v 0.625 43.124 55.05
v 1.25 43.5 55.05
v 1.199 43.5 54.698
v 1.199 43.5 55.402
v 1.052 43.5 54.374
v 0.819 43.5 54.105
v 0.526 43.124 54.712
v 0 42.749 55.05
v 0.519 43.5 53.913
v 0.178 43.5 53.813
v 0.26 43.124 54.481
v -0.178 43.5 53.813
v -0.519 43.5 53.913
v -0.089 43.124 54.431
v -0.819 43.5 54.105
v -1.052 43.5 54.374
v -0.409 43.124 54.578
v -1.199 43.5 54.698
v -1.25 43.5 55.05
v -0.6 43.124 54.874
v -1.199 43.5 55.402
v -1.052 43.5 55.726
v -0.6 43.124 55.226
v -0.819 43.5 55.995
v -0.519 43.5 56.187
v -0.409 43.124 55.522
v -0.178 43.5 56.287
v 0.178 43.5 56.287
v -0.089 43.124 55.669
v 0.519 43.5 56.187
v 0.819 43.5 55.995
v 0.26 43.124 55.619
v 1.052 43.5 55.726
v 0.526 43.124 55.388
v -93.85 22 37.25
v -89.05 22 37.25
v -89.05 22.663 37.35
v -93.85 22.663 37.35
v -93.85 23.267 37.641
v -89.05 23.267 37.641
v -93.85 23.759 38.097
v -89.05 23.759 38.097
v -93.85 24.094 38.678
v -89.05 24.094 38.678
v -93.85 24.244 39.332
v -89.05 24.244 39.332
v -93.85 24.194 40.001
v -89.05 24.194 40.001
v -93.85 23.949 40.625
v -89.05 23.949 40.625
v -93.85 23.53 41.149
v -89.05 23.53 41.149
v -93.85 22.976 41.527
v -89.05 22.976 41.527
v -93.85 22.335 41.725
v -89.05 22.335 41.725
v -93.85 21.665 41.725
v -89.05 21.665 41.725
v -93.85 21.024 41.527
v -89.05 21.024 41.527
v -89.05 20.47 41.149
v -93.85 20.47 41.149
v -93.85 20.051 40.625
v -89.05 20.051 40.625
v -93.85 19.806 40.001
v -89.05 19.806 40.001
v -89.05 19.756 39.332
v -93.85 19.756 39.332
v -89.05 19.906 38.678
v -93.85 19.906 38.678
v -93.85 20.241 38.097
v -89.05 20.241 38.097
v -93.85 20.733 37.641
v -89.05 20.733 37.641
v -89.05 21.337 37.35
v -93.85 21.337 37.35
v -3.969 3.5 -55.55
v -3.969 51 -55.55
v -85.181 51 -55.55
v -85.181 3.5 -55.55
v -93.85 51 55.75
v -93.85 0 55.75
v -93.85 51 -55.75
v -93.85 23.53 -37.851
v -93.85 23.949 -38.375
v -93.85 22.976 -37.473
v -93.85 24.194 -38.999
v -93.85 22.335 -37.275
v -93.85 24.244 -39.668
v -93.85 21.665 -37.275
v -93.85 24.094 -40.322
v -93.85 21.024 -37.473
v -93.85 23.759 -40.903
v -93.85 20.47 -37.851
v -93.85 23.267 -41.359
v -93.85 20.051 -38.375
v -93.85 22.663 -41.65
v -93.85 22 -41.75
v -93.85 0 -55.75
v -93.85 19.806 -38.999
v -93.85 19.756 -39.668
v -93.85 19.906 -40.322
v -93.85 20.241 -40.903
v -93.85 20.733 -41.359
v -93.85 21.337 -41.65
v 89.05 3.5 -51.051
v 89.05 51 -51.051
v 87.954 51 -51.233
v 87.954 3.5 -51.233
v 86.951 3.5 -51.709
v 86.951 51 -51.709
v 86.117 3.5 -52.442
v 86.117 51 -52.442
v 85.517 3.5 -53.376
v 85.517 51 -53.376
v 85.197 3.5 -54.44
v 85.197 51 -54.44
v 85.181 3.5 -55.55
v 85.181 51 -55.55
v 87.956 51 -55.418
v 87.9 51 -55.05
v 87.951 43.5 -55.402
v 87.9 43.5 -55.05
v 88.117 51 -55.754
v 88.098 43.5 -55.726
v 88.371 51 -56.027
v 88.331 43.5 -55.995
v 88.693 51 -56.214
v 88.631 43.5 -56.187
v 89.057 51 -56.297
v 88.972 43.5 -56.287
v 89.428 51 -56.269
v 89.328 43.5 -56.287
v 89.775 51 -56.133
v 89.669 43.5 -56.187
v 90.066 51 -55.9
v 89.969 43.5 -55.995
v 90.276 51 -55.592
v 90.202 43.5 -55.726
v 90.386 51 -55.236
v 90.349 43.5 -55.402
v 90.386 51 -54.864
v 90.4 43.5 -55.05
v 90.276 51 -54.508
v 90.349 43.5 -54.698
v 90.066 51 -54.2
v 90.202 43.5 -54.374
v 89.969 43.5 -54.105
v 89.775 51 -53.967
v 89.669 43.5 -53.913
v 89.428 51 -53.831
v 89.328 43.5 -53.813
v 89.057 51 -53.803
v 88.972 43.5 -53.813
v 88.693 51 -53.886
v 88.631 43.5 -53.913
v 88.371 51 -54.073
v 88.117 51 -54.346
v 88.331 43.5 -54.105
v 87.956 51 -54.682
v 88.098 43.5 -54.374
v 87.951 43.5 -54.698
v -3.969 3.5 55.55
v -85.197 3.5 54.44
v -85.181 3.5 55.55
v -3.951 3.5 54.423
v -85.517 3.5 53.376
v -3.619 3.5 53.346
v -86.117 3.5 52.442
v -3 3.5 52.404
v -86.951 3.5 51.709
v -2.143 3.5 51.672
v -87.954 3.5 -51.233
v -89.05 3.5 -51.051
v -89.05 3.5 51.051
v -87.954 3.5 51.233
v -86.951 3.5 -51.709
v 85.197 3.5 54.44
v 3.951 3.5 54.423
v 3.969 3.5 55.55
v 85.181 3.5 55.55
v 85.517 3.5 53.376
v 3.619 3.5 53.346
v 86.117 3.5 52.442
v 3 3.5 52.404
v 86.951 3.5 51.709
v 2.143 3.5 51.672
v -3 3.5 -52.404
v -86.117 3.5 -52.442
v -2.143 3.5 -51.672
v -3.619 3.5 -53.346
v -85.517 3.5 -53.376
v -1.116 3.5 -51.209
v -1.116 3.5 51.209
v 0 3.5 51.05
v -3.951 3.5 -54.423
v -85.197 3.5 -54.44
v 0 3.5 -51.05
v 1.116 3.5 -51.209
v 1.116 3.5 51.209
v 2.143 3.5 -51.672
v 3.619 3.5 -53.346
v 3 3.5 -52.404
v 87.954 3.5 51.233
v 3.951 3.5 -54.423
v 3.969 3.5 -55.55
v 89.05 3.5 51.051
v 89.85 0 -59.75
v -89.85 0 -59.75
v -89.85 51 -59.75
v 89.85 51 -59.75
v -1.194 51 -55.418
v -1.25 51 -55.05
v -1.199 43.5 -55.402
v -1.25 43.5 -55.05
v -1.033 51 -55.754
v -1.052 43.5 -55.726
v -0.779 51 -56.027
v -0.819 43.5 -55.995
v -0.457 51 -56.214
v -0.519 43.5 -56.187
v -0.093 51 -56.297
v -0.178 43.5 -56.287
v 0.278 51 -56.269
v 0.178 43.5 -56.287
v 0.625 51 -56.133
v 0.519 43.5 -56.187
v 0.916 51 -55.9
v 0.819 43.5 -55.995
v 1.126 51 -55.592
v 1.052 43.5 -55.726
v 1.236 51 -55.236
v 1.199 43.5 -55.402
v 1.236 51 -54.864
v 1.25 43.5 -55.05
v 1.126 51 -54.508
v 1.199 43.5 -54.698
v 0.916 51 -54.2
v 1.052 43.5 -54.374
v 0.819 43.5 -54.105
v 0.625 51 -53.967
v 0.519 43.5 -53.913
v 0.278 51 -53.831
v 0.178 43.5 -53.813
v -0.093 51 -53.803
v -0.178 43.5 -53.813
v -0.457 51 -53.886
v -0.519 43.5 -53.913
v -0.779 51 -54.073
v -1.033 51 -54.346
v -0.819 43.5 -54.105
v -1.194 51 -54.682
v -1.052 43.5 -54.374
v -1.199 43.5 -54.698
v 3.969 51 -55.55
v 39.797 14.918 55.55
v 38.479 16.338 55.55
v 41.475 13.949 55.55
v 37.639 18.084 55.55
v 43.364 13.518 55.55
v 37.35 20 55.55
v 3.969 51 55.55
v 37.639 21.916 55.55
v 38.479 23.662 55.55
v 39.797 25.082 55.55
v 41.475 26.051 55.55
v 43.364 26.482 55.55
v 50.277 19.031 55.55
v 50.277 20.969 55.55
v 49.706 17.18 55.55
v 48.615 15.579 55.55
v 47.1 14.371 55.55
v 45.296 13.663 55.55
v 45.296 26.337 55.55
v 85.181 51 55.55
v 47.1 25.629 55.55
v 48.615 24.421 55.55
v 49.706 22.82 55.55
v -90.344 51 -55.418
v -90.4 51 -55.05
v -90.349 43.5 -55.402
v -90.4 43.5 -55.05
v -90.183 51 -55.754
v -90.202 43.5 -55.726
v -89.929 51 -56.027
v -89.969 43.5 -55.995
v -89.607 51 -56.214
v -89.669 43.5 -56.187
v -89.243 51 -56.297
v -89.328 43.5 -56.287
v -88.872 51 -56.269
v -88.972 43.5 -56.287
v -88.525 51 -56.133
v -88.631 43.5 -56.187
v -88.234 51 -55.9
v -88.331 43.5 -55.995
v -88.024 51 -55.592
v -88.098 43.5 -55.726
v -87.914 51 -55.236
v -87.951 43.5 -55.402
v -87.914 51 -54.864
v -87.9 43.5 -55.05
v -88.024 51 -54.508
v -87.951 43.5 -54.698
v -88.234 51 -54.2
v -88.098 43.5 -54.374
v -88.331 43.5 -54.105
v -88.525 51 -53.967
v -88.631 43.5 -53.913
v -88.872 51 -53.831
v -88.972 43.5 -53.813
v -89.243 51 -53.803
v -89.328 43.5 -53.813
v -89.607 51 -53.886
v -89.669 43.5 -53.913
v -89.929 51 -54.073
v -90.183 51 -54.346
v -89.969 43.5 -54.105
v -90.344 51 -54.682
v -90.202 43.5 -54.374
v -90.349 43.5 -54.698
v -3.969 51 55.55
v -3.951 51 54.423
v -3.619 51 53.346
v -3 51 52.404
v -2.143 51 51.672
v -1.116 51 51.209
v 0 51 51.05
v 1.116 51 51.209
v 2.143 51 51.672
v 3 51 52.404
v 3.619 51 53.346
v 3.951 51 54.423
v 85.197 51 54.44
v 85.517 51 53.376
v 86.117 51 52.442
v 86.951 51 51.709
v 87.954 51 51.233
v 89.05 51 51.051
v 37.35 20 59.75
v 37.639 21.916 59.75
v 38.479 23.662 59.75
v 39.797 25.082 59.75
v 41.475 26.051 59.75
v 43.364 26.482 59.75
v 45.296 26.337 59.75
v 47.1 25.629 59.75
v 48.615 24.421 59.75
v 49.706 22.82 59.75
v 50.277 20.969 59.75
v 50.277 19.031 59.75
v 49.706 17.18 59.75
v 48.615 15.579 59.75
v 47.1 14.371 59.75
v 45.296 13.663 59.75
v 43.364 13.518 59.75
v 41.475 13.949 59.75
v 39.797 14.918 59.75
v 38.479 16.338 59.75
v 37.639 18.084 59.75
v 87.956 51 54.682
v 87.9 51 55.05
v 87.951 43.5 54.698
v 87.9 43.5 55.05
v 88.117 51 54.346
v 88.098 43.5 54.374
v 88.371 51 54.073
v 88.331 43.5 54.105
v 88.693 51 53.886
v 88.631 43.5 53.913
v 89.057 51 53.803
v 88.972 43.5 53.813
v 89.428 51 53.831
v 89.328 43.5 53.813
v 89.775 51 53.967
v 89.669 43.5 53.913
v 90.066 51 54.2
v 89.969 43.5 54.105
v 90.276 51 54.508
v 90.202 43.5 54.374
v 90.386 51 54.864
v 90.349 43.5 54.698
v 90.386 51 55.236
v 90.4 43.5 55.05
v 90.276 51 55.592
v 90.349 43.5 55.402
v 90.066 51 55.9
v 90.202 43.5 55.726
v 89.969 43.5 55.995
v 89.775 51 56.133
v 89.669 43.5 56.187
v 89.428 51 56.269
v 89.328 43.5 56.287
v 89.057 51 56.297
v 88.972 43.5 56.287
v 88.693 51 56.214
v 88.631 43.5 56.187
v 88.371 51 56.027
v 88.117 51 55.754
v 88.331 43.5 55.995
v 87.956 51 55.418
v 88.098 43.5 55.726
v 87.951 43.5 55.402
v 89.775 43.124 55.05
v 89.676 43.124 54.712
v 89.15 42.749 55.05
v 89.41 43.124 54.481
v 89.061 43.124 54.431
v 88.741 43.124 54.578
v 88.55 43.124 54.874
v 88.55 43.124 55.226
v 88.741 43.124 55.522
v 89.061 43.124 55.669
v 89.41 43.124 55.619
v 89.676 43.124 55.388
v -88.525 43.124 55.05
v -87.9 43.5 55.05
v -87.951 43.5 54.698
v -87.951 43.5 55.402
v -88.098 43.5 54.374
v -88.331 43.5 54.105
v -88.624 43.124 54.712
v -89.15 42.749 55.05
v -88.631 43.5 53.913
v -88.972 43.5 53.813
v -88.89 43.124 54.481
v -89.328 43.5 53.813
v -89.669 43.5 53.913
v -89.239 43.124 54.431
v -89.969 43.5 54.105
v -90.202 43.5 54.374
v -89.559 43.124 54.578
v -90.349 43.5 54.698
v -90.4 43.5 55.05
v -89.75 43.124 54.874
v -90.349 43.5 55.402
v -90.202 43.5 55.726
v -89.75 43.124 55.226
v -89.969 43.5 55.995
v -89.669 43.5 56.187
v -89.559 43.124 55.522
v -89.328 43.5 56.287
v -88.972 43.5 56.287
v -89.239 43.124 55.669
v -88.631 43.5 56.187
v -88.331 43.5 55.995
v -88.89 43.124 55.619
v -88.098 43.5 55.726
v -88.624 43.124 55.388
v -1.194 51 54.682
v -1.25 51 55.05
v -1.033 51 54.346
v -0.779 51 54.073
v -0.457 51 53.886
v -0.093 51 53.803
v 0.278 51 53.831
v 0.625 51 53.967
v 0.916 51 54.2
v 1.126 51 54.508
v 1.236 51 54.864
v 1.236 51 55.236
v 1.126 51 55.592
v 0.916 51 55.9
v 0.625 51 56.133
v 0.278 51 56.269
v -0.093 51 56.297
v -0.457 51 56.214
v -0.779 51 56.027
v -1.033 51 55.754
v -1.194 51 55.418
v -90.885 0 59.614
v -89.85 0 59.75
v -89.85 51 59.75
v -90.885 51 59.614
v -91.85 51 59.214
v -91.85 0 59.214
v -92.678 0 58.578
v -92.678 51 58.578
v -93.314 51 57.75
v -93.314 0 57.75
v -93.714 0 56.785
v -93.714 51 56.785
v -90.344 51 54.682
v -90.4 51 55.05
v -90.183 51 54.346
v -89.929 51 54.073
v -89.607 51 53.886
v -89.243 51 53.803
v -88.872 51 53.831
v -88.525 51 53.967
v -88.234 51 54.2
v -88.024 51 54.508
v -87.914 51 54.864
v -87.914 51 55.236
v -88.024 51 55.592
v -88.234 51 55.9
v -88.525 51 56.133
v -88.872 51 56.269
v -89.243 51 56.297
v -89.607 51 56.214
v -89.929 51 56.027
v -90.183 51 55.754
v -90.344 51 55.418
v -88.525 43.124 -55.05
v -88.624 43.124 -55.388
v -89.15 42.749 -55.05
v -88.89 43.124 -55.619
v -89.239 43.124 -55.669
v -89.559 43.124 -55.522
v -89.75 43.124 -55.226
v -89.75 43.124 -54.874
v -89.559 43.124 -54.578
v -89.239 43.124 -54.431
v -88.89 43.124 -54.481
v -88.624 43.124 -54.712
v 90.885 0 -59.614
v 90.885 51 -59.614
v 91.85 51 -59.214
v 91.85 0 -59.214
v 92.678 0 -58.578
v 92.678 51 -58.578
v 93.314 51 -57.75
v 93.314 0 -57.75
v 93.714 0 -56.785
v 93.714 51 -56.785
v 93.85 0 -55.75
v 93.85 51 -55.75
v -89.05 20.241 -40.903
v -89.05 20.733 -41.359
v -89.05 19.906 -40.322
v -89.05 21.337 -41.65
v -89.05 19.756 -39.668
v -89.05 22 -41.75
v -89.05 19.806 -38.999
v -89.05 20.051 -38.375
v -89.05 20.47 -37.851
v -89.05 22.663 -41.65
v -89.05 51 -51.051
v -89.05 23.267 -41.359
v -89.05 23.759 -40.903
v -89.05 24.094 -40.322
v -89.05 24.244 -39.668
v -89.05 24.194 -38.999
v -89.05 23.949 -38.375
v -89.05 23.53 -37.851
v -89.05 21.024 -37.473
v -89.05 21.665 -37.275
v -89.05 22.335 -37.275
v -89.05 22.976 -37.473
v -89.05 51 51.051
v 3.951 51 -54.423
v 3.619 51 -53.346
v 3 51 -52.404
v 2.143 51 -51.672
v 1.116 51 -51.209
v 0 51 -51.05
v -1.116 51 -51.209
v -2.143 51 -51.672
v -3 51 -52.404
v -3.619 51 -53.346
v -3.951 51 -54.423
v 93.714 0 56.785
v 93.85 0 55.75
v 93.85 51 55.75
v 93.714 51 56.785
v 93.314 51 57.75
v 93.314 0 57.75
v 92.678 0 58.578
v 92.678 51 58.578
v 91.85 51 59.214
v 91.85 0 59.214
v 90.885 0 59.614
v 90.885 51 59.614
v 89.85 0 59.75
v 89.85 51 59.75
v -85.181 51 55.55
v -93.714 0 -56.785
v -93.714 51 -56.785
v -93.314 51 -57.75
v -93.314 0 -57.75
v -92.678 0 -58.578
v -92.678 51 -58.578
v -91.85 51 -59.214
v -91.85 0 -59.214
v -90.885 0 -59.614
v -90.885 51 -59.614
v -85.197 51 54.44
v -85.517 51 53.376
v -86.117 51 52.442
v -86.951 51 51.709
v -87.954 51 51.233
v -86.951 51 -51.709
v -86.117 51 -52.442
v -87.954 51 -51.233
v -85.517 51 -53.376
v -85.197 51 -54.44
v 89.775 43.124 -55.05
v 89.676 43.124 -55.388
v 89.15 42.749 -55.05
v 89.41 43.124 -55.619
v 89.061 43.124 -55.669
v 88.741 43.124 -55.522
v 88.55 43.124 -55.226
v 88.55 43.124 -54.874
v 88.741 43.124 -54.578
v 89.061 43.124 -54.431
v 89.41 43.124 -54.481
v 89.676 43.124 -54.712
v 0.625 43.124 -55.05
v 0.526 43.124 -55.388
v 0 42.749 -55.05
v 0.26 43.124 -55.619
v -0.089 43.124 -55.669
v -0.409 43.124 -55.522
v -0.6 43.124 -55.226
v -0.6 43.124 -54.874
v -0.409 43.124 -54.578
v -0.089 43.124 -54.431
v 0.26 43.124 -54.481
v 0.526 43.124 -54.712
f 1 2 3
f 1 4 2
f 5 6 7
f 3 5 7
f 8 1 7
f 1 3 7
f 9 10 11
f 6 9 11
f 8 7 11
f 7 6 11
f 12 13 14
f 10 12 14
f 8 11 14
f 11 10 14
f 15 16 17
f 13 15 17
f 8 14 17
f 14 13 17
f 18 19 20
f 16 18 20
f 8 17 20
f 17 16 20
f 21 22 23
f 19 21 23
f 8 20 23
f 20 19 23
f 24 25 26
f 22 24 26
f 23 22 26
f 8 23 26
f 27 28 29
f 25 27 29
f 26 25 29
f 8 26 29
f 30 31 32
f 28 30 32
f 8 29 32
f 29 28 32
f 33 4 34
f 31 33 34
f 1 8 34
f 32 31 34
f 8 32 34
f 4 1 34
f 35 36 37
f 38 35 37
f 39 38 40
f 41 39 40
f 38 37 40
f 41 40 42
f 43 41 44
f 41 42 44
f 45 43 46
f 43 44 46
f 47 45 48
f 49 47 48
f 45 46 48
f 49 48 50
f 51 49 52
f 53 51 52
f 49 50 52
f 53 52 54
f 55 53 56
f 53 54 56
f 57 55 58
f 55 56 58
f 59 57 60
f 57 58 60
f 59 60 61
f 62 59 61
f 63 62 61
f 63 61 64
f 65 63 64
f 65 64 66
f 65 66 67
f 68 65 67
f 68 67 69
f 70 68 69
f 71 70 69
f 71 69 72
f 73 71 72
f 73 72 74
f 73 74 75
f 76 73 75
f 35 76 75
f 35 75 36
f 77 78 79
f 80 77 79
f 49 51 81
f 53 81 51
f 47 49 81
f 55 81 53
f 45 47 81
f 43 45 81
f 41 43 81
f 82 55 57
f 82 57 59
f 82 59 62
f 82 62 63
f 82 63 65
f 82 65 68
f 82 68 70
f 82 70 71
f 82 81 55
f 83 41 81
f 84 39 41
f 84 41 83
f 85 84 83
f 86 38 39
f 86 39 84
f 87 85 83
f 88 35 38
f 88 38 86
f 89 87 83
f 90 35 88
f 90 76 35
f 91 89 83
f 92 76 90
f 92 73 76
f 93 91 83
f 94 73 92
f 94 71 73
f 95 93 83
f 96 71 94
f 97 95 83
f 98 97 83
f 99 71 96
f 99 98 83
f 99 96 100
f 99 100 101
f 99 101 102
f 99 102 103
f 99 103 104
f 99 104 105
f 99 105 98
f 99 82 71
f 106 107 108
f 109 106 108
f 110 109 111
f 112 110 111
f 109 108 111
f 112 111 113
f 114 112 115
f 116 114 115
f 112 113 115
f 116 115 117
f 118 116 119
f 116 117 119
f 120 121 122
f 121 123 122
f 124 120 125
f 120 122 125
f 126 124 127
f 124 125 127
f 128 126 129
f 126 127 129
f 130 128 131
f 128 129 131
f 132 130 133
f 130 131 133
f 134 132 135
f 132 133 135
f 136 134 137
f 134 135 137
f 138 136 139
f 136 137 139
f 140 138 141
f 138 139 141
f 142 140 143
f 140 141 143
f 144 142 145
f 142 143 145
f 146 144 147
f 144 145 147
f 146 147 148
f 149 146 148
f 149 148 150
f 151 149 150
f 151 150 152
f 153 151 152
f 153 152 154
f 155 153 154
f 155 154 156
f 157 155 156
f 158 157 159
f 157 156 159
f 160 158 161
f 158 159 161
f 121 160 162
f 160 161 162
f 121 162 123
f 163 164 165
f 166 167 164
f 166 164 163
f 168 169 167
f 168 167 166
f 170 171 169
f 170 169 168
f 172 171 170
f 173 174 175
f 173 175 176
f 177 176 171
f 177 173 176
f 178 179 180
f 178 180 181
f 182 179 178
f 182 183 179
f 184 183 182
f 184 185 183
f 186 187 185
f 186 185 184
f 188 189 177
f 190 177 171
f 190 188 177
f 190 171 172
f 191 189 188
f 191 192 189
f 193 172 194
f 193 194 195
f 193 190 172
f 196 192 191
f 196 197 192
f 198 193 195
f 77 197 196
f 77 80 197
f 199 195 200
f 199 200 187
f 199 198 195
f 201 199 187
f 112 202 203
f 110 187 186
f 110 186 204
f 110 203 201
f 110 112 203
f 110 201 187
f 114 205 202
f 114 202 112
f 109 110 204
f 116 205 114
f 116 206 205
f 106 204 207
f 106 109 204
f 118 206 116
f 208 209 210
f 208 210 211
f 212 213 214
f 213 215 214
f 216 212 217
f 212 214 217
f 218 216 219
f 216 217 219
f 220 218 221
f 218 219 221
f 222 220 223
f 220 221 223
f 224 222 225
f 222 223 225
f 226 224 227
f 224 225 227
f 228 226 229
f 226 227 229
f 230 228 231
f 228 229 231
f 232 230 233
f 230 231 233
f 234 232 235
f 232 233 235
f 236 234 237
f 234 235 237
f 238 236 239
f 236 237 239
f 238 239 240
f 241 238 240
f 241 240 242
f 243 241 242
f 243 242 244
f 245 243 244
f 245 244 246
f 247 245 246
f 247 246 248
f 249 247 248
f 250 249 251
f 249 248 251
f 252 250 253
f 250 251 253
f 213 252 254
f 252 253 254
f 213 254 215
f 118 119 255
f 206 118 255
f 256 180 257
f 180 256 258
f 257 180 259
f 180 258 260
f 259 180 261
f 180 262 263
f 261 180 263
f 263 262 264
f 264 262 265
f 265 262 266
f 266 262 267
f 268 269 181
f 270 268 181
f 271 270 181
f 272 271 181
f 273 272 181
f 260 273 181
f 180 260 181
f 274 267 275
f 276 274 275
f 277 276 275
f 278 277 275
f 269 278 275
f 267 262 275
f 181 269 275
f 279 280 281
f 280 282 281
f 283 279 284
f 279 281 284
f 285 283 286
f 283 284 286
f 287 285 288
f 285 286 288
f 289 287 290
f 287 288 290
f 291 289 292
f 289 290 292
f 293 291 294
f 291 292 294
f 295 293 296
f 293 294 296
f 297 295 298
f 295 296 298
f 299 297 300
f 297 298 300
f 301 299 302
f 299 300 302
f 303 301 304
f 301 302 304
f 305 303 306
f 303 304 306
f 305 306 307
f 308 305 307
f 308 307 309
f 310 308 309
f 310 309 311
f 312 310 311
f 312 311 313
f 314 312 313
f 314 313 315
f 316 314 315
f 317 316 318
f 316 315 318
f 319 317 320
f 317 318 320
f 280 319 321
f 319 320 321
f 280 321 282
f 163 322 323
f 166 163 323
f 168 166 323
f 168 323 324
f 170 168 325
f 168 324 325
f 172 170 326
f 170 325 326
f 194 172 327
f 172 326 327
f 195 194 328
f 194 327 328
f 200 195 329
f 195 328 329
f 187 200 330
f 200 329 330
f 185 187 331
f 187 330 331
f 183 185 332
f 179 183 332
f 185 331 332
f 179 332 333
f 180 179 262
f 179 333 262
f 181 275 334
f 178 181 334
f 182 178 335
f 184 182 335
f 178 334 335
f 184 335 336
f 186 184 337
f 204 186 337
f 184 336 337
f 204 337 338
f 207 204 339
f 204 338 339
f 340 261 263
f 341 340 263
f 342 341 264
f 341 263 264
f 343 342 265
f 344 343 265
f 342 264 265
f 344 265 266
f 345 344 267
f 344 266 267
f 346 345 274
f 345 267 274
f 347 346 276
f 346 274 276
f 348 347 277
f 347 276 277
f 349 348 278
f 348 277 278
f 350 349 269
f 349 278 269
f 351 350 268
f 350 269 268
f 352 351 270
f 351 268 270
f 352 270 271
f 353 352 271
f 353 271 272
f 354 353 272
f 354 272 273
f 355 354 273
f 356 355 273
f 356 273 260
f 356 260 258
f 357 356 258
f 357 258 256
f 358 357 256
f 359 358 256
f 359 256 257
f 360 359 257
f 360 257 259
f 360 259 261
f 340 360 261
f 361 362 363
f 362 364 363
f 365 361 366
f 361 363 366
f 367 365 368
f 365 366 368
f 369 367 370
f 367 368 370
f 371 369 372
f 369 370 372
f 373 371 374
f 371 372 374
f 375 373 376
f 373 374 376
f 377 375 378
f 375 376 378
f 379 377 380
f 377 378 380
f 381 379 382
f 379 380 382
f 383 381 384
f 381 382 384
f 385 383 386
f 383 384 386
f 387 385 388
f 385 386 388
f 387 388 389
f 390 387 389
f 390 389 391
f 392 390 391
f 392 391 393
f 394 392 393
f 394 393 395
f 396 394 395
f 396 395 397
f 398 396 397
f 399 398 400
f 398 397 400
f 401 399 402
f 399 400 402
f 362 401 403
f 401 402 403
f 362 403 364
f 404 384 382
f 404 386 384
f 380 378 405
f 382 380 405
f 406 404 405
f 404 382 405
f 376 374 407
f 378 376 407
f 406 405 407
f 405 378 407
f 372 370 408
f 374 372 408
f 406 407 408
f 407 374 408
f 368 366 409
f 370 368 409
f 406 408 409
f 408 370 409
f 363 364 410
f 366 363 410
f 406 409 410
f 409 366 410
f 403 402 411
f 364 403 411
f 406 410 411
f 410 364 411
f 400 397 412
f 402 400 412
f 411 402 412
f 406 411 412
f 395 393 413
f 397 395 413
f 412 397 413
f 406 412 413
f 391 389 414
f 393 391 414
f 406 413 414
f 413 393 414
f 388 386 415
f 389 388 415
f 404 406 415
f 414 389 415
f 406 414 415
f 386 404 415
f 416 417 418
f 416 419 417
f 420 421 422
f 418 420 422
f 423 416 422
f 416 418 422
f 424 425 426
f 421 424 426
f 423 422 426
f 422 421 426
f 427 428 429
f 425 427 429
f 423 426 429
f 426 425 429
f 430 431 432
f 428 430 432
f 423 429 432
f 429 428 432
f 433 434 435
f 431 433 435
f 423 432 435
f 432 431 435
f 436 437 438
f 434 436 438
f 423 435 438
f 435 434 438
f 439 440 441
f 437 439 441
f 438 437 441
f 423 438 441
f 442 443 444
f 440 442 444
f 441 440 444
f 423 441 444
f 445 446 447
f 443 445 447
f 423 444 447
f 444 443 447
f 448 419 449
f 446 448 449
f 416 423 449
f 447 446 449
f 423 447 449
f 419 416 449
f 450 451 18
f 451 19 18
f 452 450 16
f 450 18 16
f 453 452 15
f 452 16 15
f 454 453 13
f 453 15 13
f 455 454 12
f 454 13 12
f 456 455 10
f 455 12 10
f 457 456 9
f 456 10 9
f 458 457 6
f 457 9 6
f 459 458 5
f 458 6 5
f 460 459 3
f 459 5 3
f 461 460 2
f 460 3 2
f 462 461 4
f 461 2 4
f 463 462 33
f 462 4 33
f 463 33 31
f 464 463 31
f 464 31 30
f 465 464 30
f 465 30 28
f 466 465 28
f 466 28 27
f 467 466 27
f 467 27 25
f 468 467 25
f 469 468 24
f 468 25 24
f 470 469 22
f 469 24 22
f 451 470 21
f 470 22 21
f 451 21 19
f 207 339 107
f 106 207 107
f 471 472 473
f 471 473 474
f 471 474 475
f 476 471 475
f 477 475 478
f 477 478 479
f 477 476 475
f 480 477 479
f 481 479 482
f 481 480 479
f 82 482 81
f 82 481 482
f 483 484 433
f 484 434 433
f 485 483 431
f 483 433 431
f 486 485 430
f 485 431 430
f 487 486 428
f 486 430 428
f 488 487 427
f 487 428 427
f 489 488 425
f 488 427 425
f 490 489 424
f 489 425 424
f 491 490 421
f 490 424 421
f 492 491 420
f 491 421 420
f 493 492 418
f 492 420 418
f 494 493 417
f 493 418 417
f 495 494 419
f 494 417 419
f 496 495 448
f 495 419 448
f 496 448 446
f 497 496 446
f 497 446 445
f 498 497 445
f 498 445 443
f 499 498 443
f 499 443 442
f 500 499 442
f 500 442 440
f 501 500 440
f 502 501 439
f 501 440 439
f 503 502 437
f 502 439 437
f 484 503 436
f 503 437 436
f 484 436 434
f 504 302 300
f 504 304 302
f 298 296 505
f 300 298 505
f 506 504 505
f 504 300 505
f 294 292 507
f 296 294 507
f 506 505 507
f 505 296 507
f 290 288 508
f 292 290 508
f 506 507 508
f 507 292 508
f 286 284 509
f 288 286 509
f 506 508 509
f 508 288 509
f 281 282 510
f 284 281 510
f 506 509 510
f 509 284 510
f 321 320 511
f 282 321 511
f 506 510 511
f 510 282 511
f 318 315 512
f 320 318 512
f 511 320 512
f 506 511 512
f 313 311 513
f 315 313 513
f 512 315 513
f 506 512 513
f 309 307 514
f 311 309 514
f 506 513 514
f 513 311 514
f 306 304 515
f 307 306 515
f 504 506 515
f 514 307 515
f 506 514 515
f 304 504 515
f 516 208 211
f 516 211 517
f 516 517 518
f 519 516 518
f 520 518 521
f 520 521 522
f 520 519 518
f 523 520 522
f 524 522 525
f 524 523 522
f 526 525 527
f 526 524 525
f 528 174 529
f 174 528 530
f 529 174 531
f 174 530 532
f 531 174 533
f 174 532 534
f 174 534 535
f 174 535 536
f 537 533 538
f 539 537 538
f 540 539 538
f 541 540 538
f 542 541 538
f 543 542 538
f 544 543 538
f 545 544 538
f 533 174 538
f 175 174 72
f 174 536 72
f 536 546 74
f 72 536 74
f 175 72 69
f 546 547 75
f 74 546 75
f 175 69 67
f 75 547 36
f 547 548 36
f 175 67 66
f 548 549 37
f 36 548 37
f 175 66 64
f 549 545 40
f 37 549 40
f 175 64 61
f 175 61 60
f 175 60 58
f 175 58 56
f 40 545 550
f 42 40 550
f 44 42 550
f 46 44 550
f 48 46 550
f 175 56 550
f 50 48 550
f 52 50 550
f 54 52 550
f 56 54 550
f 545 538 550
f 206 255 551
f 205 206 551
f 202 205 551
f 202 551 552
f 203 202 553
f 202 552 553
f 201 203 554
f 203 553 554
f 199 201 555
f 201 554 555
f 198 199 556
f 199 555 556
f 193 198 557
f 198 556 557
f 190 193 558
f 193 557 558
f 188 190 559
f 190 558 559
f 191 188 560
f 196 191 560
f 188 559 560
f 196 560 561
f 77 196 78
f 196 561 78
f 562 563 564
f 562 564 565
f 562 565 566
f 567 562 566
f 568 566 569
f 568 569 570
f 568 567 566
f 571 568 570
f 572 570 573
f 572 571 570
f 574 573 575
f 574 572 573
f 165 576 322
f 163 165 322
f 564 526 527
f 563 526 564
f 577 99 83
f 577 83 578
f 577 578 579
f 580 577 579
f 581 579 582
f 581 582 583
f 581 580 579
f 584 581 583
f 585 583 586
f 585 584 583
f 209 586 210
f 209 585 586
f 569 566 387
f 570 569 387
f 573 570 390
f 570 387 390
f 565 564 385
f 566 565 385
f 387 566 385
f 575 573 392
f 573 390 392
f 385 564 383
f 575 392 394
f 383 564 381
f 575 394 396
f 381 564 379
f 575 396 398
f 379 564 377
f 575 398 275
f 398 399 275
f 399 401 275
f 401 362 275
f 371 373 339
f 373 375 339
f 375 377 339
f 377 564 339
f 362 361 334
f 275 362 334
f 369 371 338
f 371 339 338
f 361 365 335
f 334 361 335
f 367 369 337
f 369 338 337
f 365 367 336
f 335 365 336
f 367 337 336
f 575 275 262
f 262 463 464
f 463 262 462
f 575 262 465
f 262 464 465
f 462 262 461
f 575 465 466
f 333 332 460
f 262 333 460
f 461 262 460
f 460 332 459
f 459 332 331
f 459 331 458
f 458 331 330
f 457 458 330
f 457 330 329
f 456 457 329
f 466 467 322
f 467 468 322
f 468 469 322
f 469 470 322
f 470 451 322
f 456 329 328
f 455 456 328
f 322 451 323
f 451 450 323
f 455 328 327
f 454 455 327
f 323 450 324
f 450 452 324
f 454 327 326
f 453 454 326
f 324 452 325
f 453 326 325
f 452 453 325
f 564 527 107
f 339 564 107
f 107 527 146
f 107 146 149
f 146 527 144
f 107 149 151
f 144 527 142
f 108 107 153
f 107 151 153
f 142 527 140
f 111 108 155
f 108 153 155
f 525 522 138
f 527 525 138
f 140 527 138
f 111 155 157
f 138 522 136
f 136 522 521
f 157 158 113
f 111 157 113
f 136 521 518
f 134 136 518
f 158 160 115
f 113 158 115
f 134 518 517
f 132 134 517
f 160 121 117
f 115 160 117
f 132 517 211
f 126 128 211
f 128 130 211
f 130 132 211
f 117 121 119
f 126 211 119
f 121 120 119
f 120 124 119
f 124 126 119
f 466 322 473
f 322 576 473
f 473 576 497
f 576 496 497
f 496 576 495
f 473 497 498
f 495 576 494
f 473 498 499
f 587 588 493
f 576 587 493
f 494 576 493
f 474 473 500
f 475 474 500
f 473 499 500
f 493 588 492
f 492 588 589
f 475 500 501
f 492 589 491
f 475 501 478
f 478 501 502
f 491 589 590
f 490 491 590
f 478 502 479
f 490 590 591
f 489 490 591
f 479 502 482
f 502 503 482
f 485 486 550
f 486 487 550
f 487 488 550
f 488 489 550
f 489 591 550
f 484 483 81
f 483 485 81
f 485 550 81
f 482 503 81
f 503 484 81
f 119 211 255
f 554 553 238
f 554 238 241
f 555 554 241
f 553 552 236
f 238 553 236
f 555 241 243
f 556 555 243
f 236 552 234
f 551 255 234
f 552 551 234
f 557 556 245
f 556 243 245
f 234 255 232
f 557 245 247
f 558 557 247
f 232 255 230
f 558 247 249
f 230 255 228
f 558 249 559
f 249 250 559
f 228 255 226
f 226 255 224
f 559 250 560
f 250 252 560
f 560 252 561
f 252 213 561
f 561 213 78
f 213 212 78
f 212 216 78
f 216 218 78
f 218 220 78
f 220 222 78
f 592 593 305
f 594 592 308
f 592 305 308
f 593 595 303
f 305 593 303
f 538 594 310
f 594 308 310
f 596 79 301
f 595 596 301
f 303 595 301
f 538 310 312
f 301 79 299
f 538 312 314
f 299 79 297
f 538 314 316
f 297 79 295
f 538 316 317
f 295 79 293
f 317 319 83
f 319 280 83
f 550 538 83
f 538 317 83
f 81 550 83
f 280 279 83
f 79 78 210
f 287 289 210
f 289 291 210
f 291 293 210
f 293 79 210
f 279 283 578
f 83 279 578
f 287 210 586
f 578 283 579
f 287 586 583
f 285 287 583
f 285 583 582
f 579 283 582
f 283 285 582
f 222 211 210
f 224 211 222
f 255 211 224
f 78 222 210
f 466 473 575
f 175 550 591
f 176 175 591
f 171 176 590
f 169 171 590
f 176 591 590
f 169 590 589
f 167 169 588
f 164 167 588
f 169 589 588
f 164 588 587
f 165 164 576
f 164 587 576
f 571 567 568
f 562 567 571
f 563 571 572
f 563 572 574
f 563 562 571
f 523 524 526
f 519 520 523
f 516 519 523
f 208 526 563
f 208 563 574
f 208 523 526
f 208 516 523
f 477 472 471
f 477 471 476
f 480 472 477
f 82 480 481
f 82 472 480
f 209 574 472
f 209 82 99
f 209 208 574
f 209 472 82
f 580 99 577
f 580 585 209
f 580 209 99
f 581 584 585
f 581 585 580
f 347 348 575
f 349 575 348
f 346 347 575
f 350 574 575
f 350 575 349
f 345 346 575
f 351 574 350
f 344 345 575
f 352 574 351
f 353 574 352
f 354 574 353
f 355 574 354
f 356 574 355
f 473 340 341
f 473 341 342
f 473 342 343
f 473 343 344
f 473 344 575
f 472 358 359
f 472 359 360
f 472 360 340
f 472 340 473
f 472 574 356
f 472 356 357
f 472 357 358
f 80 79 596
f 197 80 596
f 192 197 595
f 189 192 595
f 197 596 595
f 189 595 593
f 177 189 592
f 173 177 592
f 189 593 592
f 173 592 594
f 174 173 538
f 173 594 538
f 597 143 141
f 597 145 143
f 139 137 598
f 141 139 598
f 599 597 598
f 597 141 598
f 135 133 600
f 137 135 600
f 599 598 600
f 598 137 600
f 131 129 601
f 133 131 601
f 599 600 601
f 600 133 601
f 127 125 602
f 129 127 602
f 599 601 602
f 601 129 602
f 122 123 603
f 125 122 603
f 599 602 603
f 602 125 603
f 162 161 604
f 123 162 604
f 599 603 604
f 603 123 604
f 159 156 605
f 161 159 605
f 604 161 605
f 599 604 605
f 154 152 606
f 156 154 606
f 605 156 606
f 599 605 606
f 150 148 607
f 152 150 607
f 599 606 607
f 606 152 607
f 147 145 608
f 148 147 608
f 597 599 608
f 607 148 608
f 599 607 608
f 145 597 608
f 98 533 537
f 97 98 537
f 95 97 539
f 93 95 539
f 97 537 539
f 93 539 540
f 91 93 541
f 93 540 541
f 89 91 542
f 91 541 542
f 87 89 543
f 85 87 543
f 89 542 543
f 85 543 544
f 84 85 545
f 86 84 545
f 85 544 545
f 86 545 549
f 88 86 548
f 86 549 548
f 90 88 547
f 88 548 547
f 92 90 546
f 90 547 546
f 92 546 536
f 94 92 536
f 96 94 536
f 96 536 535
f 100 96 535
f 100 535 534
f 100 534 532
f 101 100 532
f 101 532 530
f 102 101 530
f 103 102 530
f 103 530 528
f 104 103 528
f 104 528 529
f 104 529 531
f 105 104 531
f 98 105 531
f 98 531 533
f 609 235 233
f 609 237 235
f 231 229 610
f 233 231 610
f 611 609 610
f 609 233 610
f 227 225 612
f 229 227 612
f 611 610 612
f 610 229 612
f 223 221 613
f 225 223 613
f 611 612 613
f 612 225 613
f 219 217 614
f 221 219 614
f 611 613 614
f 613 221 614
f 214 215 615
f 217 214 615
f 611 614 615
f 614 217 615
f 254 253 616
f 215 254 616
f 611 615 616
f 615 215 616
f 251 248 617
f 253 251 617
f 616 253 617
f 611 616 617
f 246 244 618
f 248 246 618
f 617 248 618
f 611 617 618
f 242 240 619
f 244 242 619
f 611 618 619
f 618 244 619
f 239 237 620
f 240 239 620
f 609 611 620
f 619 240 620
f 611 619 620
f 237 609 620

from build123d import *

# Parameters (mm, degrees)
BOSS_EXTRUDE1_DEPTH            = 51
CUT_EXTRUDE1_DEPTH             = 47.5
M3X0_5_TAPPED_HOLE1_D          = 2.5
M3X0_5_TAPPED_HOLE1_DEPTH      = 7.5
M3X0_5_TAPPED_HOLE1_TIP        = 0.751075774
M4_CLEARANCE_HOLE2_D           = 4.5
M4_CLEARANCE_HOLE2_DEPTH       = 4.8
F_13_0_13_DIAMETER_HOLE1_D     = 13
F_13_0_13_DIAMETER_HOLE1_DEPTH = 4.2


with BuildPart() as part:
    # Sketch1 → Boss-Extrude1 (new body)
    with BuildSketch(Plane(origin=(0, 0, 0), x_dir=(1, 0, 0), z_dir=(0, 1, 0))):
        with BuildLine():
            Line((-89.85, 59.75), (89.85, 59.75))
            ThreePointArc((89.85, 59.75), (92.678427125, 58.578427125), (93.85, 55.75))
            Line((93.85, 55.75), (93.85, -55.75))
            ThreePointArc((93.85, -55.75), (92.678427125, -58.578427125), (89.85, -59.75))
            Line((89.85, -59.75), (-89.85, -59.75))
            ThreePointArc((-89.85, -59.75), (-92.678427125, -58.578427125), (-93.85, -55.75))
            Line((-93.85, -55.75), (-93.85, 55.75))
            ThreePointArc((-93.85, 55.75), (-92.678427125, 58.578427125), (-89.85, 59.75))
        make_face()
    extrude(amount=BOSS_EXTRUDE1_DEPTH)

    # Sketch2 → Cut-Extrude1 (cut)
    with BuildSketch(Plane(origin=(0, 51, 0), x_dir=(1, 0, 0), z_dir=(0, 1, 0))):
        with BuildLine():
            Line((-89.05, 51.051250195), (-89.05, -51.051250195))
            ThreePointArc((-89.05, -51.051250195), (-86.117159945, -52.441958359), (-85.181373033, -55.55))
            Line((-85.181373033, -55.55), (-3.968626967, -55.55))
            ThreePointArc((-3.968626967, -55.55), (0, -51.05), (3.968626967, -55.55))
            Line((3.968626967, -55.55), (85.181373033, -55.55))
            ThreePointArc((85.181373033, -55.55), (86.117159945, -52.441958359), (89.05, -51.051250195))
            Line((89.05, -51.051250195), (89.05, 51.051250195))
            ThreePointArc((89.05, 51.051250195), (86.117159945, 52.441958359), (85.181373033, 55.55))
            Line((85.181373033, 55.55), (3.968626967, 55.55))
            ThreePointArc((3.968626967, 55.55), (0, 51.05), (-3.968626967, 55.55))
            Line((-3.968626967, 55.55), (-85.181373033, 55.55))
            ThreePointArc((-85.181373033, 55.55), (-86.117159945, 52.441958359), (-89.05, 51.051250195))
        make_face()
    extrude(amount=-CUT_EXTRUDE1_DEPTH, mode=Mode.SUBTRACT)

    # M3x0.5 Tapped Hole1
    with Locations(Plane(origin=(0, 51, 0), x_dir=(1, 0, 0), z_dir=(0, 1, 0))):
        with Locations((-89.15, 55.05), (-89.15, -55.05), (89.15, -55.05), (89.15, 55.05), (0, -55.05), (0, 55.05)):
            Hole(M3X0_5_TAPPED_HOLE1_D / 2, depth=M3X0_5_TAPPED_HOLE1_DEPTH)
            with Locations((0, 0, -(M3X0_5_TAPPED_HOLE1_DEPTH + M3X0_5_TAPPED_HOLE1_TIP / 2))):  # 118° drill point
                Cone(0, M3X0_5_TAPPED_HOLE1_D / 2, M3X0_5_TAPPED_HOLE1_TIP, mode=Mode.SUBTRACT)

    # M4 Clearance Hole2
    with Locations(Plane.ZY.offset(93.85)):
        with Locations((-39.5, 22), (39.5, 22)):
            Hole(M4_CLEARANCE_HOLE2_D / 2, depth=M4_CLEARANCE_HOLE2_DEPTH)

    # Ø13.0 (13) Diameter Hole1
    with Locations(Plane.XY.offset(59.75)):
        with Locations((43.85, 20)):
            Hole(F_13_0_13_DIAMETER_HOLE1_D / 2, depth=F_13_0_13_DIAMETER_HOLE1_DEPTH)


solid = part.part
